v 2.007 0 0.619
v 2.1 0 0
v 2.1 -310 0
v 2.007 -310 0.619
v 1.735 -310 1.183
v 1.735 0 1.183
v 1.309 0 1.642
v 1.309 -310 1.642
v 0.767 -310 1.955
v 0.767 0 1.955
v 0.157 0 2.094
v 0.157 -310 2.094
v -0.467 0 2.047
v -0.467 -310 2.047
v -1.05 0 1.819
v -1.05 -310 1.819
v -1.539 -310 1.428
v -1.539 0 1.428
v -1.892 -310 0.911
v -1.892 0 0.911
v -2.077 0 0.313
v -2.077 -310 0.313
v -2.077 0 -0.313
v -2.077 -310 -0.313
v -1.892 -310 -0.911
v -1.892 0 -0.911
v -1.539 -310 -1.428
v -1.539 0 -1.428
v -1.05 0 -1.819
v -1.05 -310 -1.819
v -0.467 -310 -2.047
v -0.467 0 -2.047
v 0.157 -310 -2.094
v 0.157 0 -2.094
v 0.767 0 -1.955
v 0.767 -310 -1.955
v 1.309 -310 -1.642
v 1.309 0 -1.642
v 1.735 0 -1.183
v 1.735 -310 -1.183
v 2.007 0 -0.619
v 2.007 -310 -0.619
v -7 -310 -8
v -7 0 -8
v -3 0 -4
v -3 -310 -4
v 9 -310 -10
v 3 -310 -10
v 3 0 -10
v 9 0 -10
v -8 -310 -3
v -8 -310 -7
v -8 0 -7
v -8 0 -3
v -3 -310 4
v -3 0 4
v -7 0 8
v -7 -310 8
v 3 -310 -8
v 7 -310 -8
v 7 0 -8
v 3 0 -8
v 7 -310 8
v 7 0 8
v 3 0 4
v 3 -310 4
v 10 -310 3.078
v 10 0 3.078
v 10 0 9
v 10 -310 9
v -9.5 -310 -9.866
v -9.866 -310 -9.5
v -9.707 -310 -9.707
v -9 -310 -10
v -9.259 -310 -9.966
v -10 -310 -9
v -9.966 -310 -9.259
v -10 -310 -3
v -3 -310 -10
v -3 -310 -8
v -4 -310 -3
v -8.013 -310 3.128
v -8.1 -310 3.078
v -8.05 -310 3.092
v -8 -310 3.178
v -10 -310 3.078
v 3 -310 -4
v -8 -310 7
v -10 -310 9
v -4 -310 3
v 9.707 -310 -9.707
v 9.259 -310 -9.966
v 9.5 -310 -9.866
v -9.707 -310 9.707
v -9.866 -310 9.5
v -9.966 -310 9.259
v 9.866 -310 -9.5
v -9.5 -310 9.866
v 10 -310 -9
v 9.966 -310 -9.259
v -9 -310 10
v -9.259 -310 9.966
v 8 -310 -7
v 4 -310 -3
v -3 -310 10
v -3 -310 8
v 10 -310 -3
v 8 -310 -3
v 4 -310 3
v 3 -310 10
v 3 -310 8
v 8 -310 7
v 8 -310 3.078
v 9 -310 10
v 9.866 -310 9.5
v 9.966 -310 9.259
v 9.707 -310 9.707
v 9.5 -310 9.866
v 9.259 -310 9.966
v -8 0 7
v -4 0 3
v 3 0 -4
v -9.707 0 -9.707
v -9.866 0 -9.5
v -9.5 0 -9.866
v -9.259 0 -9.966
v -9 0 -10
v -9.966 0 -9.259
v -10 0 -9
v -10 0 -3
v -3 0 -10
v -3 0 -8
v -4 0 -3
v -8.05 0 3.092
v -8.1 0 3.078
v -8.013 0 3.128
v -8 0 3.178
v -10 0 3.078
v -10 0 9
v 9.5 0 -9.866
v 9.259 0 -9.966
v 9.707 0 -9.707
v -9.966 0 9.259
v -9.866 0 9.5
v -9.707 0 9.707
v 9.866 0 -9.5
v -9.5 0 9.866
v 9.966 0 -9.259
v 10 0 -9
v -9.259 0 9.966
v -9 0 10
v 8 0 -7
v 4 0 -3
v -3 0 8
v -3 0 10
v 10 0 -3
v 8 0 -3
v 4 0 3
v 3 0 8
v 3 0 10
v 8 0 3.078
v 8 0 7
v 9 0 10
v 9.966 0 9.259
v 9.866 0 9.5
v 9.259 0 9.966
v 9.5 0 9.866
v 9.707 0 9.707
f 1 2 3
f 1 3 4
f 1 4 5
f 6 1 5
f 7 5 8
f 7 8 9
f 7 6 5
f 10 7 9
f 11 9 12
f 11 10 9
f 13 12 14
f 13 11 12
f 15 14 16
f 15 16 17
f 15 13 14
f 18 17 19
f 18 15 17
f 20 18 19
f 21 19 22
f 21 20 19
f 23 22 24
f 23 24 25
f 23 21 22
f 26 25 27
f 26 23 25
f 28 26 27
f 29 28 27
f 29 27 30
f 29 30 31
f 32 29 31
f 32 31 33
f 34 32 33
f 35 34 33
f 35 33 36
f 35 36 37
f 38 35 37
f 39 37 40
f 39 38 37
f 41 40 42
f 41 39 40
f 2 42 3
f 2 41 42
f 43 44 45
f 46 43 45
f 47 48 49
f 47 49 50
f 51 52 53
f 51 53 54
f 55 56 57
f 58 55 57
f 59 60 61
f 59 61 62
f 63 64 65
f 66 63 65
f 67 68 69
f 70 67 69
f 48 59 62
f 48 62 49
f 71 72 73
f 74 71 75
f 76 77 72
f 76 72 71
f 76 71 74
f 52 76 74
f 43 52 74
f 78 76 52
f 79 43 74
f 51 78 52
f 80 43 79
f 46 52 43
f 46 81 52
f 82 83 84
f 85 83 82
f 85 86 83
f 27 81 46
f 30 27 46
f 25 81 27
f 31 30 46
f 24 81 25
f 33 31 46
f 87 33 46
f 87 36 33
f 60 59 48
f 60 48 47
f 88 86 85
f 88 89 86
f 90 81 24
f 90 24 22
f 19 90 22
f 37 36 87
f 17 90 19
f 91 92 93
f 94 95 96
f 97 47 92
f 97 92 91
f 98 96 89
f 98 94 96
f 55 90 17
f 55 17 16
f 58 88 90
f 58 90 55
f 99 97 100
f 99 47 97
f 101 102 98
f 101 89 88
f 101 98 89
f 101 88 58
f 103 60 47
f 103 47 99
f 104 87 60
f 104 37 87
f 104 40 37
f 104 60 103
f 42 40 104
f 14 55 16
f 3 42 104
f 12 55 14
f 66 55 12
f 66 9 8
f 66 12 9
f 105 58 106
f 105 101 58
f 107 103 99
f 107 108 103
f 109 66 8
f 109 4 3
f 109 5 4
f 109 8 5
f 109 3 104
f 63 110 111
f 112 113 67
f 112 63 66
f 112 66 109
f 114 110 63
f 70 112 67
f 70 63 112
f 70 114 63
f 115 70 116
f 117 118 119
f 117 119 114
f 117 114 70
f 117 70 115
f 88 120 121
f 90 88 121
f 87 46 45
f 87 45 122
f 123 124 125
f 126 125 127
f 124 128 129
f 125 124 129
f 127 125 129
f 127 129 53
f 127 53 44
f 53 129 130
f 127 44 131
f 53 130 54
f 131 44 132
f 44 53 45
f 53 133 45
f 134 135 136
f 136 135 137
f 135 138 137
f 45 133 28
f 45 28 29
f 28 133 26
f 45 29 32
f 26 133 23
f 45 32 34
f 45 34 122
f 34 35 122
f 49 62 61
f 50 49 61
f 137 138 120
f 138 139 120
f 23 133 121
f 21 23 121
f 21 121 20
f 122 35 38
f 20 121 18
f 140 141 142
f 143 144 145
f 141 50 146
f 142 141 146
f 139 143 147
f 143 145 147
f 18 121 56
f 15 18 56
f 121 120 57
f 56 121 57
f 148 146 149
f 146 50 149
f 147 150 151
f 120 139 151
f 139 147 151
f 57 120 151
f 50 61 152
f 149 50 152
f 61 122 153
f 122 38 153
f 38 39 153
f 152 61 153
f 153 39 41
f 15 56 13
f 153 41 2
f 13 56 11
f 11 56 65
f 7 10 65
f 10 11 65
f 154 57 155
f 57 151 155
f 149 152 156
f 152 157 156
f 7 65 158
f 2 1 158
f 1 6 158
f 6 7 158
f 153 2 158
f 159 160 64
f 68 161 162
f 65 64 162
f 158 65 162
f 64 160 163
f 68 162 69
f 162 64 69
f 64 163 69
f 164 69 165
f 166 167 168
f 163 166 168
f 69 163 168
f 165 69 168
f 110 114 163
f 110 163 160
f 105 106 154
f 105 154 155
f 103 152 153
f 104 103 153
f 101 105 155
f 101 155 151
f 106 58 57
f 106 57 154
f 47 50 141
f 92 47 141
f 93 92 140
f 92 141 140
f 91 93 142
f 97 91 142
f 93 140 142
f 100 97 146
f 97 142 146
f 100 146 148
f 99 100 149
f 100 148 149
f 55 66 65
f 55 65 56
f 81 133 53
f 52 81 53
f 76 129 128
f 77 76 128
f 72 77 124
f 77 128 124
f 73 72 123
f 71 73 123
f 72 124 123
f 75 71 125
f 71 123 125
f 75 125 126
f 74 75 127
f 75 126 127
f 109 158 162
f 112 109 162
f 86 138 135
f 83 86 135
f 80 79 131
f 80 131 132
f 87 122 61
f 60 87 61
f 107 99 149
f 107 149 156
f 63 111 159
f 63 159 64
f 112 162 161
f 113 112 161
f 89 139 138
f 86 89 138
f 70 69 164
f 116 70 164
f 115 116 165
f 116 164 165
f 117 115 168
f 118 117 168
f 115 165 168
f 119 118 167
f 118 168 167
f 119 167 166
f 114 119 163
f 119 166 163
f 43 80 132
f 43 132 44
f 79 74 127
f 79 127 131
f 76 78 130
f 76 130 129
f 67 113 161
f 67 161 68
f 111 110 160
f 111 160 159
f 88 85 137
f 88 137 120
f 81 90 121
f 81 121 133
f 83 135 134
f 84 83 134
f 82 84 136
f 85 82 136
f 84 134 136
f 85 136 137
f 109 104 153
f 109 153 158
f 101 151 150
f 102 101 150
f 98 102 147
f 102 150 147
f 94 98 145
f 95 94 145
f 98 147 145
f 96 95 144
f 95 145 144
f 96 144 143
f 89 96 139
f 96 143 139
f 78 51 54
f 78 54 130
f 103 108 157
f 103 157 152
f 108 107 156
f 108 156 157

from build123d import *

# Parameters (mm, degrees)
F0_R     = 2.1
F2_DEPTH = 310


with BuildPart() as f2:
    # F0 (on Front) → F2 (new body)
    with BuildSketch(Plane.XZ):
        with BuildLine():
            ThreePointArc((-10, -9), (-9.7071067812, -9.7071067812), (-9, -10))
            Line((-9, -10), (-3, -10))
            Line((-3, -10), (-3, -8))
            Line((-3, -8), (-7, -8))
            Line((-7, -8), (-3, -4))
            Line((-3, -4), (3, -4))
            Line((3, -4), (7, -8))
            Line((7, -8), (3, -8))
            Line((3, -8), (3, -10))
            Line((3, -10), (9, -10))
            ThreePointArc((9, -10), (9.7071067812, -9.7071067812), (10, -9))
            Line((10, -9), (10, -3))
            Line((10, -3), (8, -3))
            Line((8, -3), (8, -7))
            Line((8, -7), (4, -3))
            Line((4, -3), (4, 3))
            Line((4, 3), (8, 7))
            Line((8, 7), (8, 3.0783633339))
            Line((8, 3.0783633339), (10, 3.0783633339))
            Line((10, 3.0783633339), (10, 9))
            ThreePointArc((10, 9), (9.7071067812, 9.7071067812), (9, 10))
            Line((9, 10), (3, 10))
            Line((3, 10), (3, 8))
            Line((3, 8), (7, 8))
            Line((7, 8), (3, 4))
            Line((3, 4), (-3, 4))
            Line((-3, 4), (-7, 8))
            Line((-7, 8), (-3, 8))
            Line((-3, 8), (-3, 10))
            Line((-3, 10), (-9, 10))
            ThreePointArc((-9, 10), (-9.7071067812, 9.7071067812), (-10, 9))
            Line((-10, 9), (-10, 3.0783633339))
            Line((-10, 3.0783633339), (-8.1, 3.0783633339))
            ThreePointArc((-8.1, 3.0783633339), (-8.0292893219, 3.1076526558), (-8, 3.1783633339))
            Line((-8, 3.1783633339), (-8, 7))
            Line((-8, 7), (-4, 3))
            Line((-4, 3), (-4, -3))
            Line((-4, -3), (-8, -7))
            Line((-8, -7), (-8, -3))
            Line((-8, -3), (-10, -3))
            Line((-10, -3), (-10, -9))
        make_face()
        Circle(F0_R, mode=Mode.SUBTRACT)
    extrude(amount=F2_DEPTH)


solid = f2.part
